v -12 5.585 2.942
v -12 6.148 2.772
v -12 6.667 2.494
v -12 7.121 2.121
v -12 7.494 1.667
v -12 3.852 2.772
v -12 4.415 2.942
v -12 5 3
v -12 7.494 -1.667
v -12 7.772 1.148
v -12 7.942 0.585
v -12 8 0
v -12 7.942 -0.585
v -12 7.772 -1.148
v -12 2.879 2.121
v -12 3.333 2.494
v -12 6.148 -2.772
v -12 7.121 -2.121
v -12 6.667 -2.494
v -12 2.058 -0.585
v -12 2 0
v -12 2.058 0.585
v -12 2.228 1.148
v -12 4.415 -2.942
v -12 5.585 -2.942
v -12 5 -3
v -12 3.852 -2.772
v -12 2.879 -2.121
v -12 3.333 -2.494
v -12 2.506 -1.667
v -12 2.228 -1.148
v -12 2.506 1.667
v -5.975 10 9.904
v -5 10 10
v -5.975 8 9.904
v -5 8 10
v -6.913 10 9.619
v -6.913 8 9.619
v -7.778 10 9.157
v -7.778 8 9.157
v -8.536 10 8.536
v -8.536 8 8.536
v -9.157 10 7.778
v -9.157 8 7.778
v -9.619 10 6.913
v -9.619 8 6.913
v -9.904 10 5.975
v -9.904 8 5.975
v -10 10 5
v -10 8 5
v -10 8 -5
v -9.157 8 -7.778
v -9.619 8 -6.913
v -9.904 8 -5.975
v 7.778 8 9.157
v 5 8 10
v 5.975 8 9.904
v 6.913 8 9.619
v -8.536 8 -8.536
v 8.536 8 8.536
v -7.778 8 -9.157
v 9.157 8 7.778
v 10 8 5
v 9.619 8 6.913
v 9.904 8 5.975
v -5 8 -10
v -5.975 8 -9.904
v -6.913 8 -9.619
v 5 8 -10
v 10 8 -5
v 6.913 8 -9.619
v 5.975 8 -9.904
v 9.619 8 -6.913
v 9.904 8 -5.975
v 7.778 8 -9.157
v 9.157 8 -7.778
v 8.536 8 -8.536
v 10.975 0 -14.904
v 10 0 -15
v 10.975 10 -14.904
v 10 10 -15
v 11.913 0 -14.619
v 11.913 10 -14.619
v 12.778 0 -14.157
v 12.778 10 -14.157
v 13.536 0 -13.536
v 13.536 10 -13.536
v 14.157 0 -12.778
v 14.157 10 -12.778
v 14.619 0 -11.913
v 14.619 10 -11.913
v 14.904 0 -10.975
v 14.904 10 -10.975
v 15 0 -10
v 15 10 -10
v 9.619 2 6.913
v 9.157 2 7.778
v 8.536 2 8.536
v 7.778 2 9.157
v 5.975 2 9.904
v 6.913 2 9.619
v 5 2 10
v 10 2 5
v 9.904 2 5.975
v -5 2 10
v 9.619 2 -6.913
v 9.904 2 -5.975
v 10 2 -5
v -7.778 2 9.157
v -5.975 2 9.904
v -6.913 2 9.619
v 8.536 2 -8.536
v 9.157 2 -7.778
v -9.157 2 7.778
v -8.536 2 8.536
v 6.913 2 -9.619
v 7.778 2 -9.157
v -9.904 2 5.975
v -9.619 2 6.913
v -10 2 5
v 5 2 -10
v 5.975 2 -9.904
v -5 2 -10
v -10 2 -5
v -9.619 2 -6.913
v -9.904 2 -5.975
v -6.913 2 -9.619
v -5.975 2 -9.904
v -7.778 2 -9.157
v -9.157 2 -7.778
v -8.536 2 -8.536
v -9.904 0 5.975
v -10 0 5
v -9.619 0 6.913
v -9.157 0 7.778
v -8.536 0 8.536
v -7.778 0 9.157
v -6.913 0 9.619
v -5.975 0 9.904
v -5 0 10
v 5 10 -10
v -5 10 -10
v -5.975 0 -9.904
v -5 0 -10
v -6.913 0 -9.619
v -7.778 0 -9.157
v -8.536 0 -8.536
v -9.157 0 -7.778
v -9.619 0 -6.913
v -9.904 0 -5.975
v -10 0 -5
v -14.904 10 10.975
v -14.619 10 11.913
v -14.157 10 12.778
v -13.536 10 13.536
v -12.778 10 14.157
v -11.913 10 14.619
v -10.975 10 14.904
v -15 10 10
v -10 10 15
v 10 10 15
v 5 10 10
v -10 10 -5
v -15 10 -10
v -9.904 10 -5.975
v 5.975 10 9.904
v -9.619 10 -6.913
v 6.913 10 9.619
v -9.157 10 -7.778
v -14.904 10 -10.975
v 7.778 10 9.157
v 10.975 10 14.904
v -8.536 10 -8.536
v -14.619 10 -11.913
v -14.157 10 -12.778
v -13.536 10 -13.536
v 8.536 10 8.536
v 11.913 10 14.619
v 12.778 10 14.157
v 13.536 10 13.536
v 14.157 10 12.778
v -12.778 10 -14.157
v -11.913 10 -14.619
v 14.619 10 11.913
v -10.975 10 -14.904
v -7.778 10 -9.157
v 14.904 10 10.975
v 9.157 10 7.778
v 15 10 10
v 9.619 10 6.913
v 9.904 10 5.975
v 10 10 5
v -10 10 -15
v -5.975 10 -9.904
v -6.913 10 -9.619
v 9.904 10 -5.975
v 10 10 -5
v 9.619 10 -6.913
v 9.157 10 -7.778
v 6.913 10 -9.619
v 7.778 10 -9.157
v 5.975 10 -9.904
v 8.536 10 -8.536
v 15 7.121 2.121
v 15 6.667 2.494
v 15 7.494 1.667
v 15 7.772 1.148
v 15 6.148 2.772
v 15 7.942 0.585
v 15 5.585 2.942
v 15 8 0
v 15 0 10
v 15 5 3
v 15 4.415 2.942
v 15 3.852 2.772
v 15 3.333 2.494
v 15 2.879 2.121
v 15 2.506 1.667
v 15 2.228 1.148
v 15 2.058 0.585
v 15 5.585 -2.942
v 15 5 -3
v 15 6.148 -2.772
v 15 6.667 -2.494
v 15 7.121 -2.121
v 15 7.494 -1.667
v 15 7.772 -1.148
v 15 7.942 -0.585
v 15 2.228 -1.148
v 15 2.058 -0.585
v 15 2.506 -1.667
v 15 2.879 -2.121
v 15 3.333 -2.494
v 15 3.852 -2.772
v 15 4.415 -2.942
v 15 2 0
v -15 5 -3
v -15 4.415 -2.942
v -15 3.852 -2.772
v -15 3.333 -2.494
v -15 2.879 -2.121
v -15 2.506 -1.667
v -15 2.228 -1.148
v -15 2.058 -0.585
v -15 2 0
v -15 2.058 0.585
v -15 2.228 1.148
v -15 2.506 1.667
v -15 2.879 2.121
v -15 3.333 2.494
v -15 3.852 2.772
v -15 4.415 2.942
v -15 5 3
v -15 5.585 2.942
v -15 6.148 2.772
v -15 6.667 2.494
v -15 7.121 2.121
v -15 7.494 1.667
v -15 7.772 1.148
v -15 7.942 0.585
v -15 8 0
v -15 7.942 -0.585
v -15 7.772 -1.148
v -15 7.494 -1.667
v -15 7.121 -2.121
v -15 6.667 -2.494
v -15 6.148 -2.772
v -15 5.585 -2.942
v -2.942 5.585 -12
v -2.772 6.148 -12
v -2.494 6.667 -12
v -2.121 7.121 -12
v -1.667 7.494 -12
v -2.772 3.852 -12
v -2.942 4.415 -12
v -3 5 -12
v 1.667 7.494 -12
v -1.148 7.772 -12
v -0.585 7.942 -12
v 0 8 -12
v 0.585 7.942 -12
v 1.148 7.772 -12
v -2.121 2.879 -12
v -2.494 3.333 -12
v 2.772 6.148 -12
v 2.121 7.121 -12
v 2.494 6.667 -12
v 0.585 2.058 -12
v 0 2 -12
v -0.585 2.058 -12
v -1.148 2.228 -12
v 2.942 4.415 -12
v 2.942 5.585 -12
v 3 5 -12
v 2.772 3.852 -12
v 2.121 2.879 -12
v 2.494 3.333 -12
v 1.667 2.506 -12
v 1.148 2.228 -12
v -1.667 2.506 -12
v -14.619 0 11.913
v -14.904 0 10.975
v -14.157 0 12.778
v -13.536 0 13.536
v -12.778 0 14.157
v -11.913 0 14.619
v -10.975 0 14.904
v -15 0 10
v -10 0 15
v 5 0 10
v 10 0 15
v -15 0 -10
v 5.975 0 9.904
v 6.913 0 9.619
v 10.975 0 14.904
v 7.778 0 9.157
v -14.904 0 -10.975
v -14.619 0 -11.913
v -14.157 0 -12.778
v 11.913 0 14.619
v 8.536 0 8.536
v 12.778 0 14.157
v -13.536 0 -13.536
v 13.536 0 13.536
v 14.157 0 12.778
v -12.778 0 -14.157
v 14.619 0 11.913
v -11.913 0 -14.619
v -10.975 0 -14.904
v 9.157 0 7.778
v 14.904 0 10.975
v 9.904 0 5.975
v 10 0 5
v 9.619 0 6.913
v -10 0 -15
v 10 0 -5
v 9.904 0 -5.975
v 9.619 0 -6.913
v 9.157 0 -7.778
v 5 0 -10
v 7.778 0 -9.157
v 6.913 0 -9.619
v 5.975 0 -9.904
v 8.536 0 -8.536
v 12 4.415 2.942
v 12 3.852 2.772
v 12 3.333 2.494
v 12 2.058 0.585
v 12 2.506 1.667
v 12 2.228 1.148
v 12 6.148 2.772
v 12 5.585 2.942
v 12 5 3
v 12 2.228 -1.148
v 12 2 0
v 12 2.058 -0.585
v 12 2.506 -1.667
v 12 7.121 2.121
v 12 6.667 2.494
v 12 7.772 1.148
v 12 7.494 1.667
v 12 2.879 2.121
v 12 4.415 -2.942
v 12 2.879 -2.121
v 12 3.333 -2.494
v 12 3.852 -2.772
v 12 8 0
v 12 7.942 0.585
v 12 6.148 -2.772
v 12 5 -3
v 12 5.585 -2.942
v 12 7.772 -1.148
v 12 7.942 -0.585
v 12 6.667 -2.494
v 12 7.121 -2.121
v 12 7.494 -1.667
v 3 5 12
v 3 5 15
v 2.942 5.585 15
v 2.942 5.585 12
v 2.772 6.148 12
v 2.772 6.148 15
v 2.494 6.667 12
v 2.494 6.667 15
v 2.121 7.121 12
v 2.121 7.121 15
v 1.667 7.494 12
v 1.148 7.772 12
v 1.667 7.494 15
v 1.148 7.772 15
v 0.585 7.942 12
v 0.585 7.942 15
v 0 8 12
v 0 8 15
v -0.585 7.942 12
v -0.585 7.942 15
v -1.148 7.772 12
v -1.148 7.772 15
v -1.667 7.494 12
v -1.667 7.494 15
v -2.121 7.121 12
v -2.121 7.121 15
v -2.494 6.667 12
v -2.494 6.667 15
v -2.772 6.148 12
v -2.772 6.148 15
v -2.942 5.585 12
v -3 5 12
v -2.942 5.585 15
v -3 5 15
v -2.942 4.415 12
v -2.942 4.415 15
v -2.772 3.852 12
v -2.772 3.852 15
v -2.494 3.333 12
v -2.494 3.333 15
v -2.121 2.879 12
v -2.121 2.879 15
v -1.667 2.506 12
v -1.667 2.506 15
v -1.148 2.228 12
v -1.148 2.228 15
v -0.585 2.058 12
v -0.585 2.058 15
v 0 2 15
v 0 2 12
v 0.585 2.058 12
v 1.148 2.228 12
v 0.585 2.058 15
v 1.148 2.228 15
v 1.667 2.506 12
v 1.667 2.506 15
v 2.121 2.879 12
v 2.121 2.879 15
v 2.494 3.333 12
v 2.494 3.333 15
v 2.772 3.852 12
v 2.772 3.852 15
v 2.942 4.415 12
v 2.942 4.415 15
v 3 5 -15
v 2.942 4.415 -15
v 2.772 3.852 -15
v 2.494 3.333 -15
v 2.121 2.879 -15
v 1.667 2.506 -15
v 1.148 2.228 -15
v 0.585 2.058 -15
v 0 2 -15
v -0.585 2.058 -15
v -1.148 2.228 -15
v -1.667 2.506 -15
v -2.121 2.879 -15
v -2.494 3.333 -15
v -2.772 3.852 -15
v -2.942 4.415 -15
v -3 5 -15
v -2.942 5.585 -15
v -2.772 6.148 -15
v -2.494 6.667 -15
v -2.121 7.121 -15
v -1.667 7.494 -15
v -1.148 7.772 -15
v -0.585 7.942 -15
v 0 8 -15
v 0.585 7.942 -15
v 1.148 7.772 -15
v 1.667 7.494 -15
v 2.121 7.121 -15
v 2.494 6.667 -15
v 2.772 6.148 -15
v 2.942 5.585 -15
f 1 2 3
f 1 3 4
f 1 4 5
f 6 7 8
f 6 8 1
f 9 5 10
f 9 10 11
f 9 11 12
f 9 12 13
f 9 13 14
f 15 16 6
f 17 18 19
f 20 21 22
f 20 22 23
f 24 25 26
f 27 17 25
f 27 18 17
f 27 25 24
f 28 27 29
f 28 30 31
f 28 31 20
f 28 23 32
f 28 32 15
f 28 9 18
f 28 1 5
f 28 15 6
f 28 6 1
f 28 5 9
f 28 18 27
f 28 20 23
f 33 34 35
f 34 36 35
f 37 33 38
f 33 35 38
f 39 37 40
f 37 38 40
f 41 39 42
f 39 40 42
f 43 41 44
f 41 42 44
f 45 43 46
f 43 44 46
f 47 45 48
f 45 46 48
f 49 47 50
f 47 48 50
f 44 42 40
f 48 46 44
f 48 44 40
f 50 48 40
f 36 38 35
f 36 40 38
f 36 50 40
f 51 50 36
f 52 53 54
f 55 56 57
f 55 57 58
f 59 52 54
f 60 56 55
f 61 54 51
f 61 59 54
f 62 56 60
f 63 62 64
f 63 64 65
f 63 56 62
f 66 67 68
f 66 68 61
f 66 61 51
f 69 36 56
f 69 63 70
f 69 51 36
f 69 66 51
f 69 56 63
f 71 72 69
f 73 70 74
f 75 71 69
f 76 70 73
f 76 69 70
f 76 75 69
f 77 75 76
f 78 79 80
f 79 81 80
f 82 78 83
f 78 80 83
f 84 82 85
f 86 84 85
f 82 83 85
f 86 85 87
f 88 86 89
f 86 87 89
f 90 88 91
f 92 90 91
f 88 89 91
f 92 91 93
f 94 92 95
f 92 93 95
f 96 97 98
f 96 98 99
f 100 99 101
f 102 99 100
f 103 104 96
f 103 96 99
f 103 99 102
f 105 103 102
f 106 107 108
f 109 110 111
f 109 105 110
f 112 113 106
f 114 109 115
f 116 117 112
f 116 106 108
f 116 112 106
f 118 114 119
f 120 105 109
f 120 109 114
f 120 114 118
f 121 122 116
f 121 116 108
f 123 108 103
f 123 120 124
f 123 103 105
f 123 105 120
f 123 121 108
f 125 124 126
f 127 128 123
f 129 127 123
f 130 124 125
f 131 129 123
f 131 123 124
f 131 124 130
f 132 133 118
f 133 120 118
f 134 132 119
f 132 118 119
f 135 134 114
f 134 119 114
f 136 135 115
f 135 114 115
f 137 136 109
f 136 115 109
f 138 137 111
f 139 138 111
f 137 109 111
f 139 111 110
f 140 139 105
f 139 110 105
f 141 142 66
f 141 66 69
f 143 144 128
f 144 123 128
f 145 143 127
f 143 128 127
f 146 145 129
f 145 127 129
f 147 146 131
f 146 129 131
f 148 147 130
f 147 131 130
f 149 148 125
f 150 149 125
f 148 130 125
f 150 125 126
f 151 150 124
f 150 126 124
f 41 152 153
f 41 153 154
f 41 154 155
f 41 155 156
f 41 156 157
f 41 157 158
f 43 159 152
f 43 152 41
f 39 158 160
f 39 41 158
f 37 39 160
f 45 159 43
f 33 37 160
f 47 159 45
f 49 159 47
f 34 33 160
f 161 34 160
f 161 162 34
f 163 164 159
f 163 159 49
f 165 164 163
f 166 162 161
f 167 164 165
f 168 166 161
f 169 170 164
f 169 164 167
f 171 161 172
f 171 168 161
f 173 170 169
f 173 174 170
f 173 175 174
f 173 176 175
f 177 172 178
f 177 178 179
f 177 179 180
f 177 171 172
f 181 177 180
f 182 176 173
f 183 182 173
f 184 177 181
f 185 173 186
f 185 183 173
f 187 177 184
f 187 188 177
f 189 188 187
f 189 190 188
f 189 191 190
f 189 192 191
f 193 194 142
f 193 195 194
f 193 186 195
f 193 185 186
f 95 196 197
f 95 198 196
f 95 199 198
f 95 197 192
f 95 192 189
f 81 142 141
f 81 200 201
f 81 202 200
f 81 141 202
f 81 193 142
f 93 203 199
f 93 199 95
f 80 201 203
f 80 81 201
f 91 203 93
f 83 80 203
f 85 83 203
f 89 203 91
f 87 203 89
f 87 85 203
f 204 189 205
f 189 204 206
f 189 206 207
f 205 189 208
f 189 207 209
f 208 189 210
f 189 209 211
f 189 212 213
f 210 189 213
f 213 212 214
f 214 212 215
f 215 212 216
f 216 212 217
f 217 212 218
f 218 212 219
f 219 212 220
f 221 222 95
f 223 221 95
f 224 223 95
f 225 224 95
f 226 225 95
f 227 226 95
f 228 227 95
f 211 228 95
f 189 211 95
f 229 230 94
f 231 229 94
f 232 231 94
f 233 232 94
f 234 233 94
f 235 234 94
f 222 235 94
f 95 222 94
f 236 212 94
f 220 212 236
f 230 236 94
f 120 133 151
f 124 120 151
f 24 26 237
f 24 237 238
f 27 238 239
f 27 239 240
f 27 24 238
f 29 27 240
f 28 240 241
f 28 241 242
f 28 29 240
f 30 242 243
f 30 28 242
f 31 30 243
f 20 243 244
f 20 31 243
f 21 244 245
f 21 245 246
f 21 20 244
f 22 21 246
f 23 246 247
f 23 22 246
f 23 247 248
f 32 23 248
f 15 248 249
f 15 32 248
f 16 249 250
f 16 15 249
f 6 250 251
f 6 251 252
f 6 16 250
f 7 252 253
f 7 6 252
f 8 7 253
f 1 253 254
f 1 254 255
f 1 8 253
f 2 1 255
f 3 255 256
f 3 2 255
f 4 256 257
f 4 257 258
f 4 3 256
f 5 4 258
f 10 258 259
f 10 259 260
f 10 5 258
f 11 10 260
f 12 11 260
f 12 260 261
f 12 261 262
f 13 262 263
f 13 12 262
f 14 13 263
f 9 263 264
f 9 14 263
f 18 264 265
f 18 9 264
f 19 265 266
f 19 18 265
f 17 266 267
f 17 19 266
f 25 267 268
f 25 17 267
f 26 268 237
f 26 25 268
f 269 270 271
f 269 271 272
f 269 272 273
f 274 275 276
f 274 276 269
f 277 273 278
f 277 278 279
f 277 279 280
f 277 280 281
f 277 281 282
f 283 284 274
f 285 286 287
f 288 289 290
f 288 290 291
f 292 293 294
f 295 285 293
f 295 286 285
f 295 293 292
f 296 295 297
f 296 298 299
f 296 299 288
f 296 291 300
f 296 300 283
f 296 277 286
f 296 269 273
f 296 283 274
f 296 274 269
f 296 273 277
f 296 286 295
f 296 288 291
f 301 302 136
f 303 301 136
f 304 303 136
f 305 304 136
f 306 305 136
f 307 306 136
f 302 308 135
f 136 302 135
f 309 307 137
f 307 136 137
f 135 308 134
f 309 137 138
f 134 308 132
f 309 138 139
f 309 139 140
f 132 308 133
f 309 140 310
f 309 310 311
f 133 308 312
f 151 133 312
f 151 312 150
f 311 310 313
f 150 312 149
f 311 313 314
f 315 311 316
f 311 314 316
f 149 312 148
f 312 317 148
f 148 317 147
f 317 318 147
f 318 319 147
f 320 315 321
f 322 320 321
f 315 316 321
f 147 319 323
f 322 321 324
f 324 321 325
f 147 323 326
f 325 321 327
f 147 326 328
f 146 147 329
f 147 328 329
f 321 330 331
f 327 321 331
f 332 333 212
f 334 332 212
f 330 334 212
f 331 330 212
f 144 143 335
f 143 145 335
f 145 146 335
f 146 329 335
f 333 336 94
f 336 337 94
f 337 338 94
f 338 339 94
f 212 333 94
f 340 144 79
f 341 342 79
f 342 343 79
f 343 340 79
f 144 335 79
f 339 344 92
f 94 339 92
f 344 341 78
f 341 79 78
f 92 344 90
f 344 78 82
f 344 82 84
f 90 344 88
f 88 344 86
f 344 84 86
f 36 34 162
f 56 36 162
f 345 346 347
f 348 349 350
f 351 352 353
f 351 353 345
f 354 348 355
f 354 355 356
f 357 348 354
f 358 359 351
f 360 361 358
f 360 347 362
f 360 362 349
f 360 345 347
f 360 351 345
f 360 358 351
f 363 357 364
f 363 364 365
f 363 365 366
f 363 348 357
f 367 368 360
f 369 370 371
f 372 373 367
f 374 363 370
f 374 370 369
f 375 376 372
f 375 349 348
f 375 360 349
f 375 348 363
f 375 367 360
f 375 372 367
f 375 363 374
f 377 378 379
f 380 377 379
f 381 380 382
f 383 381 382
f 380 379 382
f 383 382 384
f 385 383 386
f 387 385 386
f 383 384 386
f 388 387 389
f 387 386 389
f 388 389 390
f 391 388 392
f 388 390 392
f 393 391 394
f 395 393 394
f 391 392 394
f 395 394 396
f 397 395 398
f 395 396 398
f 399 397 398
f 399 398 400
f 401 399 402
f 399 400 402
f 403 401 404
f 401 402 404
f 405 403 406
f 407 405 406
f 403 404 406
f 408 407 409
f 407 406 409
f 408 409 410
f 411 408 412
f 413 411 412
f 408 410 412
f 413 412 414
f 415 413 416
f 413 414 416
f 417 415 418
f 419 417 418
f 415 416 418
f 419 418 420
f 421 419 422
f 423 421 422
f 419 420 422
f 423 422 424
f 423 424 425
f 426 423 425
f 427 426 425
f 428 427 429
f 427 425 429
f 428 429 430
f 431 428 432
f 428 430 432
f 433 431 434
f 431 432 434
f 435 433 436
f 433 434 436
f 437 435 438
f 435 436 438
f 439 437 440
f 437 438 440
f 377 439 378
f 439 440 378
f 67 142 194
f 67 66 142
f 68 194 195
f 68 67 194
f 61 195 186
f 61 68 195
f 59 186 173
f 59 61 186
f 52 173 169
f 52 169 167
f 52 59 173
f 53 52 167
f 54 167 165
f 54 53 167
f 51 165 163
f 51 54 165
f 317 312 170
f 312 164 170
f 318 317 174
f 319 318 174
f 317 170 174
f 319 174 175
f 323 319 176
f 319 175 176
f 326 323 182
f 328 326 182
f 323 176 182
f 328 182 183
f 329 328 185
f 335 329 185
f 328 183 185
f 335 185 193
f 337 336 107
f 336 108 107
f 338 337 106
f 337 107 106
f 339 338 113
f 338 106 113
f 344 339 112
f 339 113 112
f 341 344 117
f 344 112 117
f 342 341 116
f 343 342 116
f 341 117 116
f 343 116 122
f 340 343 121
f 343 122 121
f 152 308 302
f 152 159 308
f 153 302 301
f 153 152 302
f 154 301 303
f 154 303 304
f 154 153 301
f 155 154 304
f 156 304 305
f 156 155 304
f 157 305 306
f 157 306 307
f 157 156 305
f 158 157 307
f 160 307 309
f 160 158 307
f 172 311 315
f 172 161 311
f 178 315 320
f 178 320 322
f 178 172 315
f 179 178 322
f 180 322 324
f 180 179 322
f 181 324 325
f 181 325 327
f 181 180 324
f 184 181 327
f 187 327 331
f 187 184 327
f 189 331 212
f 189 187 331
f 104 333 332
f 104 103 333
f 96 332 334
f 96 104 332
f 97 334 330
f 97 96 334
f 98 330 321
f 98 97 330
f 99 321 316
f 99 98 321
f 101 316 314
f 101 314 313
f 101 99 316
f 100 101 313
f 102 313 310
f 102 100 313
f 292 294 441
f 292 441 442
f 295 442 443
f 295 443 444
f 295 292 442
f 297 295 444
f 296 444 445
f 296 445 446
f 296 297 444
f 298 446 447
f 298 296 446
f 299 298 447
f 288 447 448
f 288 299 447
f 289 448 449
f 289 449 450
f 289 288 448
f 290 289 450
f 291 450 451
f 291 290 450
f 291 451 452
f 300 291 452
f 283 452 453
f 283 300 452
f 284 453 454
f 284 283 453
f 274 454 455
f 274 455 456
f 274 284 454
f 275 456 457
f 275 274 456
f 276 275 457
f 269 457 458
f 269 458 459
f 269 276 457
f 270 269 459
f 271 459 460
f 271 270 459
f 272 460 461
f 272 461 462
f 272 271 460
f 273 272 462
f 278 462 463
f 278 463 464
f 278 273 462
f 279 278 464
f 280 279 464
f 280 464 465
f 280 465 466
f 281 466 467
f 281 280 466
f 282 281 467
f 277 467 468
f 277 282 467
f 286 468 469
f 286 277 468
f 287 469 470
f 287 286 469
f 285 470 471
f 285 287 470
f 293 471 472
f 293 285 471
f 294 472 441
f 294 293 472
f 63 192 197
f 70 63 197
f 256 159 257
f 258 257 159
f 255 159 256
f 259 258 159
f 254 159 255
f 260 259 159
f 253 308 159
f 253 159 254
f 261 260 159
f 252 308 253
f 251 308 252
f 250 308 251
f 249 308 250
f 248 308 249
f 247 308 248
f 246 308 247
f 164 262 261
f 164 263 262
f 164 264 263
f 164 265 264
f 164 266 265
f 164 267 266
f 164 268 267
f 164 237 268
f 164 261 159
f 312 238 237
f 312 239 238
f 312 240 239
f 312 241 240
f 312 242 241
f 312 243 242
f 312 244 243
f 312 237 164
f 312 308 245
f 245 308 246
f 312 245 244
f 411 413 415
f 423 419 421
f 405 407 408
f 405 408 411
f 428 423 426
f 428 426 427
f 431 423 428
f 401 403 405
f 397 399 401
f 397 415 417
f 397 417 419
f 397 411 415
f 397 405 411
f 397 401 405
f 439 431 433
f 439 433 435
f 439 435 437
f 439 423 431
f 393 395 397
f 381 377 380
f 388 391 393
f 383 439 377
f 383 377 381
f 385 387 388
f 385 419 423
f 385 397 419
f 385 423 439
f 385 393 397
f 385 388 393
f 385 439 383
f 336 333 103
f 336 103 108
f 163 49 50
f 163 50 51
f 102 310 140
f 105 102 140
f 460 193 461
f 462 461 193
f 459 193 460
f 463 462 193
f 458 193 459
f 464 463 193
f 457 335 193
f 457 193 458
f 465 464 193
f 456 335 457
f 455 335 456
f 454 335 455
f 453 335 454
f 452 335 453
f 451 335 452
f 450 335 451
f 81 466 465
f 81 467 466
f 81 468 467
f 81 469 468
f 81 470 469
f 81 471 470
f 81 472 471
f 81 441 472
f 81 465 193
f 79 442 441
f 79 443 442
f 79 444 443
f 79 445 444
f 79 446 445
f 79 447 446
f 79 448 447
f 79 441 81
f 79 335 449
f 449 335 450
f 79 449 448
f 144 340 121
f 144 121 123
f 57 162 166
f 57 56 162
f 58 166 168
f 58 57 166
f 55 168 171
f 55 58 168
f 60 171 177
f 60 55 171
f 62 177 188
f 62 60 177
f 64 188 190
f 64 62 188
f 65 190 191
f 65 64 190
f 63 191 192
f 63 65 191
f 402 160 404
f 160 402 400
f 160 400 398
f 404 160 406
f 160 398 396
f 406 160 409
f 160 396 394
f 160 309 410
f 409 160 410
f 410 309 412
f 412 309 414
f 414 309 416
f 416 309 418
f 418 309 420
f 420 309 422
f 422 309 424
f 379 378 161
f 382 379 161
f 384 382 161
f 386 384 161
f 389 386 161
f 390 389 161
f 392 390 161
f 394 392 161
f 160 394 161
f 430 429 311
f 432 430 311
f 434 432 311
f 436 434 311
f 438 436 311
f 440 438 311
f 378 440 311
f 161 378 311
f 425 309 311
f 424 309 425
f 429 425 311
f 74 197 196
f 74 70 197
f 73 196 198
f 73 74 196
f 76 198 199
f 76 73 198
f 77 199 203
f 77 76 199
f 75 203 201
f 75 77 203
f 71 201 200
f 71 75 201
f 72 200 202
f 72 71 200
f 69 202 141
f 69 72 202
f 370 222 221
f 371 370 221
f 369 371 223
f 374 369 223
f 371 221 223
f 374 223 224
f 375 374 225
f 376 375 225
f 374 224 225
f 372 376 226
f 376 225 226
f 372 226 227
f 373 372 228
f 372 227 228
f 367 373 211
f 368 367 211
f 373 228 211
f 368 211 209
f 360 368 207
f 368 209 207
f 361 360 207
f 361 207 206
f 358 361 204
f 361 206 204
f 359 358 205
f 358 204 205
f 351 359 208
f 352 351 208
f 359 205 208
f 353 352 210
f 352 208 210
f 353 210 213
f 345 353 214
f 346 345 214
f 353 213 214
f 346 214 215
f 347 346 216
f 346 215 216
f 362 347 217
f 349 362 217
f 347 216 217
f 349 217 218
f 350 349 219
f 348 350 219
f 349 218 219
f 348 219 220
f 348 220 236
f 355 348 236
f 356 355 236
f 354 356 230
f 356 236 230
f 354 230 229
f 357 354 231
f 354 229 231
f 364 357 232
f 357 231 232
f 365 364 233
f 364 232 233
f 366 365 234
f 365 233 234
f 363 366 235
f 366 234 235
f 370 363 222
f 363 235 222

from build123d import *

# Parameters (mm, degrees)
SKETCH2_W           = 30
SKETCH2_H           = 30
BOSS_EXTRUDE1_DEPTH = 10
SKETCH3_R           = 3
CUT_EXTRUDE1_DEPTH  = 3
SKETCH4_R           = 3
CUT_EXTRUDE2_DEPTH  = 3
CUT_EXTRUDE3_START  = -3
SKETCH5_R           = 3
CUT_EXTRUDE3_DEPTH  = 3
CUT_EXTRUDE4_START  = -3
SKETCH6_R           = 3
CUT_EXTRUDE4_DEPTH  = 3
FILLET1_R           = 5
SKETCH8_W           = 20
SKETCH8_H           = 20
CUT_EXTRUDE6_DEPTH  = 2
FILLET2_R           = 5
SKETCH9_W           = 20
SKETCH9_H           = 20
CUT_EXTRUDE7_DEPTH  = 2
FILLET3_R           = 5


with BuildPart() as part:
    # Sketch2 → Boss-Extrude1 (new body)
    with BuildSketch(Plane(origin=(0, 0, 0), x_dir=(1, 0, 0), z_dir=(0, 1, 0))):
        Rectangle(SKETCH2_W, SKETCH2_H)
    extrude(amount=BOSS_EXTRUDE1_DEPTH)

    # Sketch3 → Cut-Extrude1 (cut)
    with BuildSketch(Plane.XY.offset(15)):
        with Locations((0, 5)):
            Circle(SKETCH3_R)
    extrude(amount=-CUT_EXTRUDE1_DEPTH, mode=Mode.SUBTRACT)

    # Sketch4 → Cut-Extrude2 (cut)
    with BuildSketch(Plane(origin=(15, 0, 0), x_dir=(0, 0, -1), z_dir=(1, 0, 0))):
        with Locations((0, 5)):
            Circle(SKETCH4_R)
    extrude(amount=-CUT_EXTRUDE2_DEPTH, mode=Mode.SUBTRACT)

    # Sketch5 → Cut-Extrude3 (cut)
    with BuildSketch(Plane(origin=(0, 0, -15), x_dir=(-1, 0, 0), z_dir=(0, 0, -1)).offset(CUT_EXTRUDE3_START)):
        with Locations(Location((0, 5, 0), (0, 0, 180))):
            Circle(SKETCH5_R)
    extrude(amount=CUT_EXTRUDE3_DEPTH, mode=Mode.SUBTRACT)

    # Sketch6 → Cut-Extrude4 (cut)
    with BuildSketch(Plane.ZY.offset(15).offset(CUT_EXTRUDE4_START)):
        with Locations(Location((0, 5, 0), (0, 0, 180))):
            Circle(SKETCH6_R)
    extrude(amount=CUT_EXTRUDE4_DEPTH, mode=Mode.SUBTRACT)

    # Fillet1
    fillet1_edges = [part.edges().sort_by_distance(p)[0] for p in [
        (15, 5, 15),
        (-15, 5, 15),
        (-15, 5, -15),
        (15, 5, -15),
    ]]
    fillet(fillet1_edges, radius=FILLET1_R)

    # Sketch8 → Cut-Extrude6 (cut)
    with BuildSketch(Plane(origin=(0, 10, 0), x_dir=(1, 0, 0), z_dir=(0, 1, 0))):
        Rectangle(SKETCH8_W, SKETCH8_H)
    extrude(amount=-CUT_EXTRUDE6_DEPTH, mode=Mode.SUBTRACT)

    # Fillet2
    fillet2_edges = [part.edges().sort_by_distance(p)[0] for p in [
        (10, 9, -10),
        (10, 9, 10),
        (-10, 9, 10),
        (-10, 9, -10),
    ]]
    fillet(fillet2_edges, radius=FILLET2_R)

    # Sketch9 → Cut-Extrude7 (cut)
    with BuildSketch(Plane(origin=(0, 0, 0), x_dir=(-1, 0, 0), z_dir=(0, -1, 0))):
        Rectangle(SKETCH9_W, SKETCH9_H)
    extrude(amount=-CUT_EXTRUDE7_DEPTH, mode=Mode.SUBTRACT)

    # Fillet3
    fillet3_edges = [part.edges().sort_by_distance(p)[0] for p in [
        (10, 1, 10),
        (10, 1, -10),
        (-10, 1, -10),
        (-10, 1, 10),
    ]]
    fillet(fillet3_edges, radius=FILLET3_R)


solid = part.part
